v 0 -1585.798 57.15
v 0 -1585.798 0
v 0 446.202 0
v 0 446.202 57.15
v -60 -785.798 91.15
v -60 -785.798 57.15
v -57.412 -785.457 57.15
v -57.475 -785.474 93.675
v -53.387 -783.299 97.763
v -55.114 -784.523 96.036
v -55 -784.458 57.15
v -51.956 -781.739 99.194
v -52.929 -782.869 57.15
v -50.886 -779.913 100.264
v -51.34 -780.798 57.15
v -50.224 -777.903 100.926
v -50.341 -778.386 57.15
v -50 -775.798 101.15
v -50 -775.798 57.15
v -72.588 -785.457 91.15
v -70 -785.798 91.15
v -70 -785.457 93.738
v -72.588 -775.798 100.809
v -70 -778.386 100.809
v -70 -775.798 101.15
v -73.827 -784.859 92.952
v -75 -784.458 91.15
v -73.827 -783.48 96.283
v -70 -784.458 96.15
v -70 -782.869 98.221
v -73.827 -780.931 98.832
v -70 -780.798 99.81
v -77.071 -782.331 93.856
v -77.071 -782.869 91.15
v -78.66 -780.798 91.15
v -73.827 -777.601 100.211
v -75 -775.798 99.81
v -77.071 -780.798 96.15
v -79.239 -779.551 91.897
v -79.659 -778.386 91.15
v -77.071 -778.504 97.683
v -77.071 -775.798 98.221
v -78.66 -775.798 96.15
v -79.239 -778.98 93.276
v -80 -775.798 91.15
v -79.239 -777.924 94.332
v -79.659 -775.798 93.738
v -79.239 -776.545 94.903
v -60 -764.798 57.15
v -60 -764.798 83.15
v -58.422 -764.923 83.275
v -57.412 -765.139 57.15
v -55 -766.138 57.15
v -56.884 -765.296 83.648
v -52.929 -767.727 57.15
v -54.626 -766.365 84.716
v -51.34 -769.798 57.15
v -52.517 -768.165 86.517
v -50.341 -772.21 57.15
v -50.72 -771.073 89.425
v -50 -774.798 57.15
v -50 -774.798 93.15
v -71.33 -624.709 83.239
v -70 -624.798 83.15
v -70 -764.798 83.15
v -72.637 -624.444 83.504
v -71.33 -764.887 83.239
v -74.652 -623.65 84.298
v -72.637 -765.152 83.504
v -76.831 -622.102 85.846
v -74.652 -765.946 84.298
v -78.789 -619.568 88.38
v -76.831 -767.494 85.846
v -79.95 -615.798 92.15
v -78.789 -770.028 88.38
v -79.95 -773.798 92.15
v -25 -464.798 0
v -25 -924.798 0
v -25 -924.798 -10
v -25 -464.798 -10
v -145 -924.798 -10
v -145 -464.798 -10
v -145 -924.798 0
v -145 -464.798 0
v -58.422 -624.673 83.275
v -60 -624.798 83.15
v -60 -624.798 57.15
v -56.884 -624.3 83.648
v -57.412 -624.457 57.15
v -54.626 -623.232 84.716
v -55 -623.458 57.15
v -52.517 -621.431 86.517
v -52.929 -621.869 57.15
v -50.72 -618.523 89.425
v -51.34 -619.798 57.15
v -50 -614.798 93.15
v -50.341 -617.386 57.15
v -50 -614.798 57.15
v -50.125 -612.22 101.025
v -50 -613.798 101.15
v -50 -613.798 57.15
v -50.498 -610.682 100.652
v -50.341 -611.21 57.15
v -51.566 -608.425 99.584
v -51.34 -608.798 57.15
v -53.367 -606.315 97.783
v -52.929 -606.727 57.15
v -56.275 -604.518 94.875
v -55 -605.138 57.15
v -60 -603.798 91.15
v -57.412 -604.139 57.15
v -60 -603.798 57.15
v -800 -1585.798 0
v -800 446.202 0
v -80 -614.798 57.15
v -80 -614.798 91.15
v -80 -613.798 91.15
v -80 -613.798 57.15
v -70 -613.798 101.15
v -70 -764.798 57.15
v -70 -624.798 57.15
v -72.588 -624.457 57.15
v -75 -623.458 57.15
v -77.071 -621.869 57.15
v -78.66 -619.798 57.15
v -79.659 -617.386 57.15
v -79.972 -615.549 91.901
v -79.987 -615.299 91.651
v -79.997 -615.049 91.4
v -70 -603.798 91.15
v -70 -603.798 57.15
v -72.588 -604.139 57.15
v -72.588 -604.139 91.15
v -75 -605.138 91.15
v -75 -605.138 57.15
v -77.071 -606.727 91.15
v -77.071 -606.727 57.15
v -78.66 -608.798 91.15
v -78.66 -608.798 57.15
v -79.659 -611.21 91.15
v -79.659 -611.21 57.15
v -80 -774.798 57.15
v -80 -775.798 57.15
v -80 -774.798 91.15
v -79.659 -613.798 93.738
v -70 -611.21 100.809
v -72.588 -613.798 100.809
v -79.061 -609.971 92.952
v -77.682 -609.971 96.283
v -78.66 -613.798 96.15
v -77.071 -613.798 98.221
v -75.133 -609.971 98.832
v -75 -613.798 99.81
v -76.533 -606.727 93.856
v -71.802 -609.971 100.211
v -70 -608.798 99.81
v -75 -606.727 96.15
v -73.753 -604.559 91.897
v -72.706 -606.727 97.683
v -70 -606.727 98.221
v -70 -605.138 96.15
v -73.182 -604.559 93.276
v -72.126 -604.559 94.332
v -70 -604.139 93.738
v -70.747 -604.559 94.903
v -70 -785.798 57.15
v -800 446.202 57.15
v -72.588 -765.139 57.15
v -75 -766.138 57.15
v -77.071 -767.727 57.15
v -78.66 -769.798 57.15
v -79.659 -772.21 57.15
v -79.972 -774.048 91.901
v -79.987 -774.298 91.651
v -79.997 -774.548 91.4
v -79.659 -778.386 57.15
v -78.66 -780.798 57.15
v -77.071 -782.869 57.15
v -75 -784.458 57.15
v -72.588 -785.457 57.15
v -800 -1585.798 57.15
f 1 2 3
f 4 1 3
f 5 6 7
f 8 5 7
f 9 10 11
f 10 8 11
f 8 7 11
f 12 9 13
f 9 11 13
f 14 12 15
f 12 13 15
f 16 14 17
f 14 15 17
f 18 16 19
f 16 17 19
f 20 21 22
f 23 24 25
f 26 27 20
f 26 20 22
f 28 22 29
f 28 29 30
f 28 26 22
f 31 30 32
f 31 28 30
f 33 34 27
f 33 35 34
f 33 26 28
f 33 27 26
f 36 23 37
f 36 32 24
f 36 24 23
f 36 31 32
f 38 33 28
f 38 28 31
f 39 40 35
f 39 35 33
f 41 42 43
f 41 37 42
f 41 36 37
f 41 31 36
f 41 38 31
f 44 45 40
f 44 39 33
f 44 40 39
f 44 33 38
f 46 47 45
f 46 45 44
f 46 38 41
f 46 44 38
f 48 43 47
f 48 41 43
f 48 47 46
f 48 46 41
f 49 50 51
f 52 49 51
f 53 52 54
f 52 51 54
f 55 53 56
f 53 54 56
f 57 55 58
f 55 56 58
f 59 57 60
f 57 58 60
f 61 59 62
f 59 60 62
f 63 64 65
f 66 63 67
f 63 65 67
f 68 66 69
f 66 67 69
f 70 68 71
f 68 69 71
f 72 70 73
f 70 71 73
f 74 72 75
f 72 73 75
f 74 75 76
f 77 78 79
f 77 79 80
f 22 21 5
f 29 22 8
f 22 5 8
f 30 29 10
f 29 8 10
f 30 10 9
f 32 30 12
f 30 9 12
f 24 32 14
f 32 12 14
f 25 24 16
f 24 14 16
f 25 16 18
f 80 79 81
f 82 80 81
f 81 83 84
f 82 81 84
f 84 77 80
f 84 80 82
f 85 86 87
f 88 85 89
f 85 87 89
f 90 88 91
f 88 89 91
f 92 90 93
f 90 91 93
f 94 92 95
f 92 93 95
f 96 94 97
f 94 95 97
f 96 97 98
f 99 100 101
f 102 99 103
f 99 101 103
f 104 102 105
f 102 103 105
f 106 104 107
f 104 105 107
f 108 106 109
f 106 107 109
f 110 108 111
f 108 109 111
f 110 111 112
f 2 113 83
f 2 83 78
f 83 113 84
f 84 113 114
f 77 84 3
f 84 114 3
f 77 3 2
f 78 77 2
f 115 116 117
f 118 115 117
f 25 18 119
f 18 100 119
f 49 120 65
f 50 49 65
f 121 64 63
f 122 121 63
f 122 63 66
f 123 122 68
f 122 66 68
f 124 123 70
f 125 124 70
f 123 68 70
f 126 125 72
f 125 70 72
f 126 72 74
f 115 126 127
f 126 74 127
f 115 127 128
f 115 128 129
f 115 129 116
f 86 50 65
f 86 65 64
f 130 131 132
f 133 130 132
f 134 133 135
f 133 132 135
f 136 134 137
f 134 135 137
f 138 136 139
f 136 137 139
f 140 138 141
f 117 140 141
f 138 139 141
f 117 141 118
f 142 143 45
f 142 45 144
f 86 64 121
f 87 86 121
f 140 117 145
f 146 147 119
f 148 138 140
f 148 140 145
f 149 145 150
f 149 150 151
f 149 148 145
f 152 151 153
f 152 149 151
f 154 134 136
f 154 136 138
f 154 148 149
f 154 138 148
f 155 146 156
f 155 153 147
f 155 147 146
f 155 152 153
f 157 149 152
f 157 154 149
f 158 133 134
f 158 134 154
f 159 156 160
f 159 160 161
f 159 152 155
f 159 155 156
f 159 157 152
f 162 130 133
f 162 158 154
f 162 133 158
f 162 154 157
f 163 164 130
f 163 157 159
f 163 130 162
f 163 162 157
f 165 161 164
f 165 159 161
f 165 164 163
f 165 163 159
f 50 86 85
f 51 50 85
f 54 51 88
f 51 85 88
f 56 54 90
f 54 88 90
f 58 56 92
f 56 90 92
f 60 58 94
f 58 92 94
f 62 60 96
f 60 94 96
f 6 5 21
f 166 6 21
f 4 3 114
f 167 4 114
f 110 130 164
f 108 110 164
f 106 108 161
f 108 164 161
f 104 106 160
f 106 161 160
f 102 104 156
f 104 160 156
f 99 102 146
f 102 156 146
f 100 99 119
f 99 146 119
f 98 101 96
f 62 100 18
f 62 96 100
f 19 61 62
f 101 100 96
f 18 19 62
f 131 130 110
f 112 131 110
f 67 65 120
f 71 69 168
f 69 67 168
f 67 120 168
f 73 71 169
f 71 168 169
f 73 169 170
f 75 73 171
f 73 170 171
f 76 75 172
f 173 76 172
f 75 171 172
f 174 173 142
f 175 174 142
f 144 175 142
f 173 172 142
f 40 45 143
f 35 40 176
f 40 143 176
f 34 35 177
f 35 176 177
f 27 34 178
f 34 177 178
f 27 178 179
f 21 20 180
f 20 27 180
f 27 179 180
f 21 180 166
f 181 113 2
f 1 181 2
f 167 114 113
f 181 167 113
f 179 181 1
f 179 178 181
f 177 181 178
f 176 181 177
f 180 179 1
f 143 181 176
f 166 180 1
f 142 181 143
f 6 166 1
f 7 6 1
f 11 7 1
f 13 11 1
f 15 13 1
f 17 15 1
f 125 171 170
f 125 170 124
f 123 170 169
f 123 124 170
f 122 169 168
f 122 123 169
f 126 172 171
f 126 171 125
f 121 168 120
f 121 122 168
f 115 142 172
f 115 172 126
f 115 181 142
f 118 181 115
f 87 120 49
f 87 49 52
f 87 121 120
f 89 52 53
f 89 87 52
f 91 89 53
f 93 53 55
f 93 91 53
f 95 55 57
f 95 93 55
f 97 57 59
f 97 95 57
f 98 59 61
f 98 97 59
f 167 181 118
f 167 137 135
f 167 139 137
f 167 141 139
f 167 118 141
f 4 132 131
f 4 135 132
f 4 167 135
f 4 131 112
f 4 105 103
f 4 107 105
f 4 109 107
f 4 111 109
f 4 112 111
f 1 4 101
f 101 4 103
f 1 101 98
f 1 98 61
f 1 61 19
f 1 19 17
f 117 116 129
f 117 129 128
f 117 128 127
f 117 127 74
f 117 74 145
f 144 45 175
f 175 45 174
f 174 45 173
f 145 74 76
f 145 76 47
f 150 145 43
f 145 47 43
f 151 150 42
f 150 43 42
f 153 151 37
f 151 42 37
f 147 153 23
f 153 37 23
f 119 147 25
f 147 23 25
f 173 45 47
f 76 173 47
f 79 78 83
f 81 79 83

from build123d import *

# Parameters (mm, degrees)
BOSS_EXTRUDE2_DEPTH = 57.15
BOSS_EXTRUDE3_DEPTH = 44
CUT_EXTRUDE1_DEPTH  = 44
FILLET1_R           = 10
SKETCH6_W           = 120
SKETCH6_H           = 460.0000000000001
BOSS_EXTRUDE4_DEPTH = 10


with BuildPart() as part:
    # Sketch1 → Boss-Extrude2 (new body)
    with BuildSketch(Plane.XY):
        Polygon((0, 0), (0, 446.2018372120283), (-800, 446.2018372120282), (-799.9999999999998, -1585.7981627879717), (0, -1585.7981627879717), align=None)
    extrude(amount=BOSS_EXTRUDE2_DEPTH)

    # Sketch4 → Boss-Extrude3 (add)
    with BuildSketch(Plane.XY.offset(57.15)):
        Polygon((-79.99999999999993, -603.7981627879718), (-49.999999999999936, -603.7981627879718), (-49.999999999999915, -785.7981627879718), (-79.9999999999999, -785.7981627879718), align=None)
    extrude(amount=BOSS_EXTRUDE3_DEPTH)

    # Sketch5 → Cut-Extrude1 (cut)
    with BuildSketch(Plane.ZY.offset(80.00000000000003)):
        Polygon((83.14999999999999, -624.7981627879717), (57.150000000000006, -624.7981627879717), (57.15, -764.7981627879717), (83.15, -764.7981627879717), align=None)
    extrude(amount=-CUT_EXTRUDE1_DEPTH, mode=Mode.SUBTRACT)

    # Fillet1
    # the kernel refuses this fillet: 10 mm, written as the material it takes off along each edge
    with BuildSketch(Plane(origin=(-69.99999999999993, -613.7981627879718, 91.15), x_dir=(-1, -1.6e-16, 0), z_dir=(0, 1, 0))) as fillet1_piece_1_section:
        Polygon((0, 0), (FILLET1_R, 0), (FILLET1_R, FILLET1_R), (0, FILLET1_R), align=None)
    fillet1_piece_1 = extrude(amount=FILLET1_R, mode=Mode.PRIVATE)
    fillet1_piece_1 = fillet1_piece_1 - Plane(origin=(-69.99999999999993, -613.7981627879718, 91.15), x_dir=(0.7071067811865475, 0, -0.7071067811865475), z_dir=(0, 1, 0)) * Sphere(FILLET1_R, mode=Mode.PRIVATE)
    add(fillet1_piece_1, mode=Mode.SUBTRACT)
    with BuildSketch(Plane(origin=(-69.9999999999999, -775.7981627879718, 91.15), x_dir=(0, 0, 1), z_dir=(-1, -1.6e-16, 0))) as fillet1_piece_2_section:
        Polygon((0, 0), (FILLET1_R, 0), (FILLET1_R, -FILLET1_R), (0, -FILLET1_R), align=None)
    fillet1_piece_2 = extrude(amount=FILLET1_R, mode=Mode.PRIVATE)
    fillet1_piece_2 = fillet1_piece_2 - Plane(origin=(-69.9999999999999, -775.7981627879718, 91.15), x_dir=(0, 0.7071067811865475, -0.7071067811865475), z_dir=(-1, -1.6e-16, 0)) * Sphere(FILLET1_R, mode=Mode.PRIVATE)
    add(fillet1_piece_2, mode=Mode.SUBTRACT)
    with BuildSketch(Plane(origin=(-49.999999999999915, -785.7981627879718, 57.15), x_dir=(-1, 0, 0), z_dir=(0, 0, 1))) as fillet1_piece_3:
        with BuildLine():
            CenterArc((FILLET1_R, -FILLET1_R), FILLET1_R, 90, 90)
            Line((0, -FILLET1_R), (0, 0))
            Line((0, 0), (FILLET1_R, 0))
        make_face()
    extrude(amount=69, mode=Mode.SUBTRACT)
    with BuildSketch(Plane(origin=(-49.999999999999936, -603.7981627879718, 57.15), x_dir=(0, -1, 0), z_dir=(0, 0, 1))) as fillet1_piece_4:
        with BuildLine():
            CenterArc((FILLET1_R, -FILLET1_R), FILLET1_R, 90, 90)
            Line((0, -FILLET1_R), (0, 0))
            Line((0, 0), (FILLET1_R, 0))
        make_face()
    extrude(amount=69, mode=Mode.SUBTRACT)
    with BuildSketch(Plane(origin=(-79.99999999999993, -603.7981627879718, 57.15), x_dir=(1, 0, 0), z_dir=(0, 0, 1))) as fillet1_piece_5:
        with BuildLine():
            CenterArc((FILLET1_R, -FILLET1_R), FILLET1_R, 90, 90)
            Line((0, -FILLET1_R), (0, 0))
            Line((0, 0), (FILLET1_R, 0))
        make_face()
    extrude(amount=34.00000000000001, mode=Mode.SUBTRACT)
    with BuildSketch(Plane(origin=(-79.9999999999999, -785.7981627879718, 57.15), x_dir=(1, 0, 0), z_dir=(0, 0, 1))) as fillet1_piece_6:
        with BuildLine():
            CenterArc((FILLET1_R, FILLET1_R), FILLET1_R, 180, 90)
            Line((0, FILLET1_R), (0, 0))
            Line((0, 0), (FILLET1_R, 0))
        make_face()
    extrude(amount=34.00000000000001, mode=Mode.SUBTRACT)
    with BuildSketch(Plane(origin=(-69.99999999999993, -603.7981627879718, 101.15), x_dir=(0, 0, -1), z_dir=(1, 0, 0))) as fillet1_piece_7:
        with BuildLine():
            CenterArc((FILLET1_R, -FILLET1_R), FILLET1_R, 90, 90)
            Line((0, -FILLET1_R), (0, 0))
            Line((0, 0), (FILLET1_R, 0))
        make_face()
    extrude(amount=44.99999999999999, mode=Mode.SUBTRACT)
    with BuildSketch(Plane(origin=(-79.9999999999999, -775.7981627879718, 101.15), x_dir=(0, 0, -1), z_dir=(-1.6e-16, 1, 0))) as fillet1_piece_8:
        with BuildLine():
            CenterArc((FILLET1_R, -FILLET1_R), FILLET1_R, 90, 90)
            Line((0, -FILLET1_R), (0, 0))
            Line((0, 0), (FILLET1_R, 0))
        make_face()
    extrude(amount=162, mode=Mode.SUBTRACT)
    with BuildSketch(Plane(origin=(-24.999999999999915, -785.7981627879718, 101.15), x_dir=(0, 0, -1), z_dir=(-1, 0, 0))) as fillet1_piece_9:
        with BuildLine():
            CenterArc((FILLET1_R, -FILLET1_R), FILLET1_R, 90, 90)
            Line((0, -FILLET1_R), (0, 0))
            Line((0, 0), (FILLET1_R, 0))
        make_face()
    extrude(amount=44.999999999999986, mode=Mode.SUBTRACT)
    with BuildSketch(Plane(origin=(-79.99999999999991, -764.7981627879717, 57.15000000000002), x_dir=(1.42e-15, -1, 0), z_dir=(0, 0, 1))) as fillet1_piece_10:
        with BuildLine():
            CenterArc((FILLET1_R, FILLET1_R), FILLET1_R, 180, 89.99999999999989)
            Line((1.421e-14, FILLET1_R), (0, 0))
            Line((0, 0), (FILLET1_R, 0))
        make_face()
    extrude(amount=25.999999999999986, mode=Mode.SUBTRACT)
    with BuildSketch(Plane(origin=(-79.99999999999993, -624.7981627879717, 83.14999999999999), x_dir=(0, 1, 0), z_dir=(0, 0, -1))) as fillet1_piece_11:
        with BuildLine():
            CenterArc((FILLET1_R, FILLET1_R), FILLET1_R, 180, 90)
            Line((0, FILLET1_R), (0, 0))
            Line((0, 0), (FILLET1_R, 0))
        make_face()
    extrude(amount=25.999999999999986, mode=Mode.SUBTRACT)
    with BuildSketch(Plane(origin=(-79.99999999999991, -764.7981627879717, 83.15), x_dir=(1.42e-15, 1e-16, 1), z_dir=(-1.5e-16, 1, -1e-16))) as fillet1_piece_12:
        with BuildLine():
            CenterArc((FILLET1_R, FILLET1_R), FILLET1_R, 180, 89.99999999999989)
            Line((1.421e-14, FILLET1_R), (0, 0))
            Line((0, 0), (FILLET1_R, 0))
        make_face()
    extrude(amount=140, mode=Mode.SUBTRACT)
    with BuildSketch(Plane(origin=(-49.999999999999915, -764.7981627879717, 83.15), x_dir=(0, -1, 0), z_dir=(0, 0, -1))) as fillet1_piece_13:
        with BuildLine():
            CenterArc((FILLET1_R, FILLET1_R), FILLET1_R, 180, 90)
            Line((0, FILLET1_R), (0, 0))
            Line((0, 0), (FILLET1_R, 0))
        make_face()
    extrude(amount=26, mode=Mode.SUBTRACT)
    with BuildSketch(Plane(origin=(-49.999999999999936, -624.7981627879717, 57.150000000000006), x_dir=(0, 1, 0), z_dir=(0, 0, 1))) as fillet1_piece_14:
        with BuildLine():
            CenterArc((FILLET1_R, FILLET1_R), FILLET1_R, 180.00000000000003, 90)
            Line((0, FILLET1_R), (0, 0))
            Line((0, 0), (FILLET1_R, 0))
        make_face()
    extrude(amount=25.999999999999986, mode=Mode.SUBTRACT)
    with BuildSketch(Plane(origin=(-49.999999999999936, -624.7981627879717, 83.15), x_dir=(0, 1e-16, 1), z_dir=(1.2e-16, -1, 1e-16))) as fillet1_piece_15:
        with BuildLine():
            CenterArc((FILLET1_R, FILLET1_R), FILLET1_R, 180, 90)
            Line((0, FILLET1_R), (0, 0))
            Line((0, 0), (FILLET1_R, 0))
        make_face()
    extrude(amount=140, mode=Mode.SUBTRACT)
    with BuildSketch(Plane(origin=(-79.99999999999991, -764.7981627879717, 57.15000000000002), x_dir=(1.42e-15, -1, 0), z_dir=(0, 0, 1))) as fillet1_piece_16a_section:
        with BuildLine():
            CenterArc((FILLET1_R, FILLET1_R), FILLET1_R, 180, 89.99999999999989)
            Line((1.421e-14, FILLET1_R), (0, 0))
            Line((0, 0), (FILLET1_R, 0))
        make_face()
    fillet1_piece_16a = extrude(amount=50.999999999999986, mode=Mode.PRIVATE)
    fillet1_piece_16a = split(fillet1_piece_16a, bisect_by=Plane(origin=(-77.7360488573316, -767.0621139306398, 83.15), z_dir=(0, 1e-16, 1)), keep=Keep.TOP, mode=Mode.PRIVATE)
    with BuildSketch(Plane(origin=(-79.9999999999999, -789.7981627879717, 83.15), x_dir=(0, 1e-16, 1), z_dir=(-1.5e-16, 1, -1e-16))) as fillet1_piece_16b_section:
        with BuildLine():
            CenterArc((FILLET1_R, FILLET1_R), FILLET1_R, 180, 90)
            Line((0, FILLET1_R), (0, 0))
            Line((0, 0), (FILLET1_R, 0))
        make_face()
    fillet1_piece_16b = extrude(amount=165, mode=Mode.PRIVATE)
    fillet1_piece_16b = split(fillet1_piece_16b, bisect_by=Plane(origin=(-77.73604885733165, -764.7981627879717, 85.41395114266827), z_dir=(1.5e-16, -1, 0)), keep=Keep.TOP, mode=Mode.PRIVATE)
    fillet1_piece_16 = fillet1_piece_16a & fillet1_piece_16b
    add(fillet1_piece_16, mode=Mode.SUBTRACT)
    with BuildSketch(Plane(origin=(-79.99999999999991, -764.7981627879717, 83.15), x_dir=(1.42e-15, 1e-16, 1), z_dir=(-1.5e-16, 1, -1e-16))) as fillet1_piece_17a_section:
        with BuildLine():
            CenterArc((FILLET1_R, FILLET1_R), FILLET1_R, 180, 89.99999999999989)
            Line((1.421e-14, FILLET1_R), (0, 0))
            Line((0, 0), (FILLET1_R, 0))
        make_face()
    fillet1_piece_17a = extrude(amount=165, mode=Mode.PRIVATE)
    fillet1_piece_17a = split(fillet1_piece_17a, bisect_by=Plane(origin=(-77.73604885733167, -624.7981627879717, 85.41395114266825), z_dir=(-1.5e-16, 1, 0)), keep=Keep.TOP, mode=Mode.PRIVATE)
    with BuildSketch(Plane(origin=(-79.99999999999993, -624.7981627879717, 108.14999999999998), x_dir=(0, 1, 0), z_dir=(0, 0, -1))) as fillet1_piece_17b_section:
        with BuildLine():
            CenterArc((FILLET1_R, FILLET1_R), FILLET1_R, 180, 90)
            Line((0, FILLET1_R), (0, 0))
            Line((0, 0), (FILLET1_R, 0))
        make_face()
    fillet1_piece_17b = extrude(amount=50.999999999999986, mode=Mode.PRIVATE)
    fillet1_piece_17b = split(fillet1_piece_17b, bisect_by=Plane(origin=(-77.73604885733164, -622.5342116453035, 83.14999999999999), z_dir=(0, 1e-16, 1)), keep=Keep.TOP, mode=Mode.PRIVATE)
    fillet1_piece_17 = fillet1_piece_17a & fillet1_piece_17b
    add(fillet1_piece_17, mode=Mode.SUBTRACT)
    with BuildSketch(Plane(origin=(-49.999999999999936, -624.7981627879717, 83.15), x_dir=(0, 1e-16, 1), z_dir=(1.2e-16, -1, 1e-16))) as fillet1_piece_18a_section:
        with BuildLine():
            CenterArc((FILLET1_R, FILLET1_R), FILLET1_R, 180, 90)
            Line((0, FILLET1_R), (0, 0))
            Line((0, 0), (FILLET1_R, 0))
        make_face()
    fillet1_piece_18a = extrude(amount=165, mode=Mode.PRIVATE)
    fillet1_piece_18a = split(fillet1_piece_18a, bisect_by=Plane(origin=(-52.26395114266817, -764.7981627879717, 85.41395114266827), z_dir=(1.5e-16, -1, 0)), keep=Keep.TOP, mode=Mode.PRIVATE)
    with BuildSketch(Plane(origin=(-49.999999999999915, -764.7981627879717, 108.15), x_dir=(0, -1, 0), z_dir=(0, 0, -1))) as fillet1_piece_18b_section:
        with BuildLine():
            CenterArc((FILLET1_R, FILLET1_R), FILLET1_R, 180, 90)
            Line((0, FILLET1_R), (0, 0))
            Line((0, 0), (FILLET1_R, 0))
        make_face()
    fillet1_piece_18b = extrude(amount=51, mode=Mode.PRIVATE)
    fillet1_piece_18b = split(fillet1_piece_18b, bisect_by=Plane(origin=(-52.2639511426682, -767.0621139306397, 83.15), z_dir=(0, 1e-16, 1)), keep=Keep.TOP, mode=Mode.PRIVATE)
    fillet1_piece_18 = fillet1_piece_18a & fillet1_piece_18b
    add(fillet1_piece_18, mode=Mode.SUBTRACT)
    with BuildSketch(Plane(origin=(-49.999999999999936, -624.7981627879717, 57.150000000000006), x_dir=(0, 1, 0), z_dir=(0, 0, 1))) as fillet1_piece_19a_section:
        with BuildLine():
            CenterArc((FILLET1_R, FILLET1_R), FILLET1_R, 180.00000000000003, 90)
            Line((0, FILLET1_R), (0, 0))
            Line((0, 0), (FILLET1_R, 0))
        make_face()
    fillet1_piece_19a = extrude(amount=50.999999999999986, mode=Mode.PRIVATE)
    fillet1_piece_19a = split(fillet1_piece_19a, bisect_by=Plane(origin=(-52.26395114266823, -622.5342116453035, 83.14999999999999), z_dir=(0, 1e-16, 1)), keep=Keep.TOP, mode=Mode.PRIVATE)
    with BuildSketch(Plane(origin=(-49.999999999999936, -599.7981627879717, 83.14999999999999), x_dir=(0, 1e-16, 1), z_dir=(1.2e-16, -1, 1e-16))) as fillet1_piece_19b_section:
        with BuildLine():
            CenterArc((FILLET1_R, FILLET1_R), FILLET1_R, 179.99999999999997, 90)
            Line((0, FILLET1_R), (0, 0))
            Line((0, 0), (FILLET1_R, 0))
        make_face()
    fillet1_piece_19b = extrude(amount=165, mode=Mode.PRIVATE)
    fillet1_piece_19b = split(fillet1_piece_19b, bisect_by=Plane(origin=(-52.26395114266818, -624.7981627879717, 85.41395114266824), z_dir=(-1.5e-16, 1, 0)), keep=Keep.TOP, mode=Mode.PRIVATE)
    fillet1_piece_19 = fillet1_piece_19a & fillet1_piece_19b
    add(fillet1_piece_19, mode=Mode.SUBTRACT)

    # Sketch6 → Boss-Extrude4 (add)
    with BuildSketch(Plane(origin=(0, 0, 0), x_dir=(-1, 0, 0), z_dir=(0, 0, -1))):
        with Locations((85, -694.7981627879719)):
            Rectangle(SKETCH6_W, SKETCH6_H)
    extrude(amount=BOSS_EXTRUDE4_DEPTH)


solid = part.part
